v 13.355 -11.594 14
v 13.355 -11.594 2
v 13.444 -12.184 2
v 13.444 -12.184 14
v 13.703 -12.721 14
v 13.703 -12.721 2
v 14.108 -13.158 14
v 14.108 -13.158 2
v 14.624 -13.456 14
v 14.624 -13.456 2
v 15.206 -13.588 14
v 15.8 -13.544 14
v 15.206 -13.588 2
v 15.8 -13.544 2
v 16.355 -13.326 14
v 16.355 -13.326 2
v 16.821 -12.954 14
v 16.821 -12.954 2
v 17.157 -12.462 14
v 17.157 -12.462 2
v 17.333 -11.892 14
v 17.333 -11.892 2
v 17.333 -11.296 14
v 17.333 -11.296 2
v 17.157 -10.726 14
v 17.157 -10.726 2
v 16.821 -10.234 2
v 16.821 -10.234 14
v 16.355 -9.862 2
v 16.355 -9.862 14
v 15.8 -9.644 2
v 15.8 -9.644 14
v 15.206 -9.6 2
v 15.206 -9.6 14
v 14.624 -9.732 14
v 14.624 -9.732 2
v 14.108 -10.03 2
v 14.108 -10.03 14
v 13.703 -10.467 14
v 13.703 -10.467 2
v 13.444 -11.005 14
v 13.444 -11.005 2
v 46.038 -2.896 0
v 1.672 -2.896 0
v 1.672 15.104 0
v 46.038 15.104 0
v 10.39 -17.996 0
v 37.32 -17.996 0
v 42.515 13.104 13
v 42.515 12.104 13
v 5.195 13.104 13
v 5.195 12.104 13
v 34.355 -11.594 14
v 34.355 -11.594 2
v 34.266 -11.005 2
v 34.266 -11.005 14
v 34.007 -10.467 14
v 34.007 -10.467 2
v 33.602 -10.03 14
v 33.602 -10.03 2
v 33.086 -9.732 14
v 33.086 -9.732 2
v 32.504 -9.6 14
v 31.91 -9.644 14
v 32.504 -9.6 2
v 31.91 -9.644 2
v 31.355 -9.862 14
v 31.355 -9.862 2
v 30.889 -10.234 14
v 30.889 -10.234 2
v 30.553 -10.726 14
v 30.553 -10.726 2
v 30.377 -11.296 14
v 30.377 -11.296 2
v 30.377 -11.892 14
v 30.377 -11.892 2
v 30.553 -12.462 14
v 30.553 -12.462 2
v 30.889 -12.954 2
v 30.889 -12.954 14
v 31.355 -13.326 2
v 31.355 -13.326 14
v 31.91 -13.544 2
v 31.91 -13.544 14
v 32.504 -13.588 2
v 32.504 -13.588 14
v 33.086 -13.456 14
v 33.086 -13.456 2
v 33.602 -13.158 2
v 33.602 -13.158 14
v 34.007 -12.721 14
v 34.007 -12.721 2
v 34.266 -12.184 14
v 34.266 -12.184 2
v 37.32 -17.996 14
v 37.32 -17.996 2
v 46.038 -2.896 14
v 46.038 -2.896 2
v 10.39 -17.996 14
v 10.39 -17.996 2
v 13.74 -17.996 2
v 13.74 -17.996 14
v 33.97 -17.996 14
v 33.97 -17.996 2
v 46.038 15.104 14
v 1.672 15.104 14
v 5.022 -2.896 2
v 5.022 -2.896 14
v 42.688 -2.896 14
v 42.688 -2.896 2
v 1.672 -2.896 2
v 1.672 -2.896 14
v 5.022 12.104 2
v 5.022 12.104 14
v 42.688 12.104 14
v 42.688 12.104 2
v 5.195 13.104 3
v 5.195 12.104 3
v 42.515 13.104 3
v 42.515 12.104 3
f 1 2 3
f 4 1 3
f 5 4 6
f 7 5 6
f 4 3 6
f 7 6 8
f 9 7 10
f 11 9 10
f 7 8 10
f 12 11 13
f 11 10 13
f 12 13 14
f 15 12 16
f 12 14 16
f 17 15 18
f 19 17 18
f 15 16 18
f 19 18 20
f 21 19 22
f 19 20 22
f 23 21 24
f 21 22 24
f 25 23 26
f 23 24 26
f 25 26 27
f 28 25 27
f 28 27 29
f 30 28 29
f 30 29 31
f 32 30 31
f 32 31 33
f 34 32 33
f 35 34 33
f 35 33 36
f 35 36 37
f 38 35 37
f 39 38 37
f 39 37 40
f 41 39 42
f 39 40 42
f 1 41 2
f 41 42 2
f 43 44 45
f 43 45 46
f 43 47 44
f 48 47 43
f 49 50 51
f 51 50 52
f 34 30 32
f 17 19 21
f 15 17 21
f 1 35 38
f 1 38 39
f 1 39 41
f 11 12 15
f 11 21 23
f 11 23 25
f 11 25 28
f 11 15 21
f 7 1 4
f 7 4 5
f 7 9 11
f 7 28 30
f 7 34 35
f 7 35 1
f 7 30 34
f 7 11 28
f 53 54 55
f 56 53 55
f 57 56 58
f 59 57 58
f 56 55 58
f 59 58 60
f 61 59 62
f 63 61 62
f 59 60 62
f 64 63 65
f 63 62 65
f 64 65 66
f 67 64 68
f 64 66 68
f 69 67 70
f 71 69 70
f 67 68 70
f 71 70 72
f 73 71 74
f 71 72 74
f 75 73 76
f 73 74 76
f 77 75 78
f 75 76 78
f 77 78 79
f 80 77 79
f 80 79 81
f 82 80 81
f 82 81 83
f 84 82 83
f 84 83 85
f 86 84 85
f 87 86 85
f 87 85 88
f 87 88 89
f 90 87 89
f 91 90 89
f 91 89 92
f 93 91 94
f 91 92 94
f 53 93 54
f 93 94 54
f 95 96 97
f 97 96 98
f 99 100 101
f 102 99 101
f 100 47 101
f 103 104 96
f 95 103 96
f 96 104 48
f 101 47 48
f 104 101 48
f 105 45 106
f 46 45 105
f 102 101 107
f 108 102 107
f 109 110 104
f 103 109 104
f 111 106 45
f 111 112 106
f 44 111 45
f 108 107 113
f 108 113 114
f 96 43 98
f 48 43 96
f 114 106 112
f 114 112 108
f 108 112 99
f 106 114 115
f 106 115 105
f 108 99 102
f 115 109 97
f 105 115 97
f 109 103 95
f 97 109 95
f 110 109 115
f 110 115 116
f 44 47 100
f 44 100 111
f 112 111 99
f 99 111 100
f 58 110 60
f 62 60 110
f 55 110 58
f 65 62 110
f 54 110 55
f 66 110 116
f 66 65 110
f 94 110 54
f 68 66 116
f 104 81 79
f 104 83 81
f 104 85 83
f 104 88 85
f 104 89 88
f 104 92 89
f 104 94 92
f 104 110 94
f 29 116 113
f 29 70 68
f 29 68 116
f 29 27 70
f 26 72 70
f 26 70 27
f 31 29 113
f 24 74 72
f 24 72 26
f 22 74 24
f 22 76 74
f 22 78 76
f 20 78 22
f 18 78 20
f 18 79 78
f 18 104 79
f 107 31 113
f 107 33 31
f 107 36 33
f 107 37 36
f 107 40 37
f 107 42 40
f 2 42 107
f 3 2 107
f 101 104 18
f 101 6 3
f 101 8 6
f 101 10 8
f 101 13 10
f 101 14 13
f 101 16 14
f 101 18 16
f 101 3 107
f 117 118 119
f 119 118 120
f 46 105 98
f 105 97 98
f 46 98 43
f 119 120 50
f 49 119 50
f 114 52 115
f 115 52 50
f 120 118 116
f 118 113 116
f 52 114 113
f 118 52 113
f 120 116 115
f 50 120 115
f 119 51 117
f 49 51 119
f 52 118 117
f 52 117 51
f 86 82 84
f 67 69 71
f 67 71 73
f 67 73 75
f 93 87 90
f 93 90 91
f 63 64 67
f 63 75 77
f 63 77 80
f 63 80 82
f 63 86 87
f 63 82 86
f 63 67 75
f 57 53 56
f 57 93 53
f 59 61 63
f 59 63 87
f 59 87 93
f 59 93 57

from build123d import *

# Parameters (mm, degrees)
EXTRUDE_1_DEPTH     = 2
EXTRUDE_5_DEPTH     = 12
SKETCH_3_R          = 2
EXTRUDE_6_DEPTH     = 12
CUT_EXTRUDE_1_DEPTH = 12
EXTRUDE_7_DEPTH     = 15
SKETCH_7_W          = 44.36597813
SKETCH_7_H          = 14
EXTRUDE_8_DEPTH     = 3
SKETCH_9_W          = 18.66
SKETCH_9_H          = 10
CUT_EXTRUDE_3_DEPTH = 1


with BuildPart() as part:
    # 스케치2 → 보스-돌출1 (new body)
    with BuildSketch(Plane.XY):
        Polygon((0, 0), (47.71, 0), (37.32, -17.996007891), (10.39, -17.996007891), align=None)
    extrude(amount=EXTRUDE_1_DEPTH)

    # 스케치4 → 보스-돌출5 (add)
    with BuildSketch(Plane.XY.offset(2)):
        Polygon((13.739529946, -17.996007891), (5.021540881, -2.896007891), (1.672010935, -2.896007891), (10.39, -17.996007891), align=None)
        Polygon((46.037989065, -2.896007891), (42.688459119, -2.896007891), (33.970470054, -17.996007891), (37.32, -17.996007891), align=None)
    extrude(amount=EXTRUDE_5_DEPTH)

    # 스케치3 → 보스-돌출6 (add)
    with BuildSketch(Plane.XY.offset(2)):
        with Locations(Location((15.355, -11.594084102, 0), (0, 0, 180))):
            Circle(SKETCH_3_R)
        with Locations((32.355, -11.594084102)):
            Circle(SKETCH_3_R)
    extrude(amount=EXTRUDE_6_DEPTH)

    # 스케치5 → 컷-돌출1 (cut)
    with BuildSketch(Plane.XY.offset(2)):
        Polygon((0, 0), (47.71, 0), (46.037989065, -2.896007891), (1.672010935, -2.896007891), align=None)
    extrude(amount=-CUT_EXTRUDE_1_DEPTH, mode=Mode.SUBTRACT)

    # 스케치6 → 보스-돌출7 (add)
    with BuildSketch(Plane(origin=(0, -2.896007891, 0), x_dir=(1, 0, 0), z_dir=(0, 1, 0))):
        Polygon((5.021540881, -14), (1.672010935, -14), (1.672010935, 0), (46.037989065, 0), (46.037989065, -14), (42.688459119, -14), (42.688459119, -2), (5.021540881, -2), align=None)
    extrude(amount=EXTRUDE_7_DEPTH)

    # 스케치7 → 보스-돌출8 (add)
    with BuildSketch(Plane(origin=(0, 12.103992109, 0), x_dir=(1, 0, 0), z_dir=(0, 1, 0))):
        with Locations((23.855, -7)):
            Rectangle(SKETCH_7_W, SKETCH_7_H)
    extrude(amount=EXTRUDE_8_DEPTH)

    # 스케치9 → 컷-돌출3 (cut)
    with BuildSketch(Plane.XZ.offset(-12.103992109)):
        with Locations((14.525, 8)):
            Rectangle(SKETCH_9_W, SKETCH_9_H)
        with Locations((33.185, 8)):
            Rectangle(SKETCH_9_W, SKETCH_9_H)
    extrude(amount=-CUT_EXTRUDE_3_DEPTH, mode=Mode.SUBTRACT)


solid = part.part
